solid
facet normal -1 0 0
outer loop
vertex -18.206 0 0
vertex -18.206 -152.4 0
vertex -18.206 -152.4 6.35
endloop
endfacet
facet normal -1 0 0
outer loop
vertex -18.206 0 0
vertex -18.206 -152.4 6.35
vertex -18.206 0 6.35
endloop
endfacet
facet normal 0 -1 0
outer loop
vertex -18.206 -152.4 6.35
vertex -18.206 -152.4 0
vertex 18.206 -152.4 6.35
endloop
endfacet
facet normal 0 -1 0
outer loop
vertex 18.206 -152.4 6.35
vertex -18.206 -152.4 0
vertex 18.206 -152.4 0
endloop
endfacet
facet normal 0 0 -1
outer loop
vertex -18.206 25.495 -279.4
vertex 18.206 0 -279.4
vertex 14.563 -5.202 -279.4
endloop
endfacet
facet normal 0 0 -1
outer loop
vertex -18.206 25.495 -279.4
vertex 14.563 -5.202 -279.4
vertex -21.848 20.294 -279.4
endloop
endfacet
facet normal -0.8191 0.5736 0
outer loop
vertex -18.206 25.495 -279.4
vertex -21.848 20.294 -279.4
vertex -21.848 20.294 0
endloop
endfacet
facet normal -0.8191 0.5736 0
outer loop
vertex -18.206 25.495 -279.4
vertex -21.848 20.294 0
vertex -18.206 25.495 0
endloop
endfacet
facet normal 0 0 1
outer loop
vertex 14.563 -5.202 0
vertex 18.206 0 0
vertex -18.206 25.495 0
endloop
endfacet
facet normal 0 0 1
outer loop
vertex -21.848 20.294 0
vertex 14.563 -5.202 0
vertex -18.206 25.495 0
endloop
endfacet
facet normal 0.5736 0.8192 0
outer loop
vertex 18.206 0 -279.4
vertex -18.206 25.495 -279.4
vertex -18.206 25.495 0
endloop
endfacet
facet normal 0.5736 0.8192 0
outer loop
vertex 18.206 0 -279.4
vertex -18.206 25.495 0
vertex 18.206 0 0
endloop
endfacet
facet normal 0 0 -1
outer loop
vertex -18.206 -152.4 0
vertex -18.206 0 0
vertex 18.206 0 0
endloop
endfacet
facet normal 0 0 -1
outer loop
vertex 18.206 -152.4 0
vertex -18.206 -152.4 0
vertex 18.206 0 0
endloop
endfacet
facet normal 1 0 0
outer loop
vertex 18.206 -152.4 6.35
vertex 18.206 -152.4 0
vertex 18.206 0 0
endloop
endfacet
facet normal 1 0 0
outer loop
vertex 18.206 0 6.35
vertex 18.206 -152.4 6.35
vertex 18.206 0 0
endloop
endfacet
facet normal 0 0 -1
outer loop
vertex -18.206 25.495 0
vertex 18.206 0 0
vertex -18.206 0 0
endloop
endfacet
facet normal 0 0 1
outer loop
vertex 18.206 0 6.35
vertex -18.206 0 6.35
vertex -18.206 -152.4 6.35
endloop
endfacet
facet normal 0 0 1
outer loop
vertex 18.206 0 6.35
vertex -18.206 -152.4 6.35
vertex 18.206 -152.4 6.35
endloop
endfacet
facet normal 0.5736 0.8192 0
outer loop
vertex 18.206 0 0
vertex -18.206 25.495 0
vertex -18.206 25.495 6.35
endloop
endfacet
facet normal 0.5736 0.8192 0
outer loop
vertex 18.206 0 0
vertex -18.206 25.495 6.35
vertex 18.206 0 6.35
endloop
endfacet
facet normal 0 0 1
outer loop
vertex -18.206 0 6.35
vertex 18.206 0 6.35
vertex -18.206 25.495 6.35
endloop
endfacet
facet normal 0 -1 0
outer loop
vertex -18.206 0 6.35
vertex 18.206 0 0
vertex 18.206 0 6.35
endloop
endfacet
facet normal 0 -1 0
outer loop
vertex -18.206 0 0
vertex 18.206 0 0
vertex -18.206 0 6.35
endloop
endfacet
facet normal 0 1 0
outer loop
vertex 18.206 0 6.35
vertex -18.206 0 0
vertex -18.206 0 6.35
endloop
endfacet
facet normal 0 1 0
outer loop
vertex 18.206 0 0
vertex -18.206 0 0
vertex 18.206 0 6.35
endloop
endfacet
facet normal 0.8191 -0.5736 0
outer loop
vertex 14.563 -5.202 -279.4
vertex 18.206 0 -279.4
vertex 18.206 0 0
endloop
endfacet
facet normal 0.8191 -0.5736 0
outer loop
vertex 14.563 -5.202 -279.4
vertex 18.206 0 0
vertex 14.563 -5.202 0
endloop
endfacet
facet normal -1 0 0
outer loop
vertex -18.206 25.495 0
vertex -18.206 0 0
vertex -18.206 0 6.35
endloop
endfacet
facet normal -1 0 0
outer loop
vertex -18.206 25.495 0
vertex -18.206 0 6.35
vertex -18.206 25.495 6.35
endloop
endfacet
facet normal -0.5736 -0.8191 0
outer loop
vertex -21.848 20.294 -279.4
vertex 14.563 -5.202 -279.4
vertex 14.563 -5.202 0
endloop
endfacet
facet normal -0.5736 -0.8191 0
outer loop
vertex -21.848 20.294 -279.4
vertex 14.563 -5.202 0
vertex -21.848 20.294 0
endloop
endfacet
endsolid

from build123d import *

# Parameters (mm, degrees)
BOSS_EXTRUDE1_DEPTH = 6.35
SKETCH2_W           = 36.411308368
SKETCH2_H           = 152.4
BOSS_EXTRUDE2_DEPTH = 6.35
BOSS_EXTRUDE3_DEPTH = 279.4


with BuildPart() as part:
    # Sketch1 → Boss-Extrude1 (new body)
    with BuildSketch(Plane.XY):
        Polygon((-18.205654184, 25.495472596), (18.205654184, 0), (-18.205654184, 0), align=None)
    extrude(amount=BOSS_EXTRUDE1_DEPTH)


with BuildPart() as body_2:
    # Sketch2 → Boss-Extrude2 (new body)
    with BuildSketch(Plane.XY):
        with Locations((0, -76.2)):
            Rectangle(SKETCH2_W, SKETCH2_H)
    extrude(amount=BOSS_EXTRUDE2_DEPTH)


with BuildPart() as body_3:
    # Sketch3 → Boss-Extrude3 (new body)
    with BuildSketch(Plane.XY):
        Polygon((-18.205654184, 25.495472596), (18.205654184, 0), (14.563443813, -5.201615481), (-21.847864555, 20.293857115), align=None)
    extrude(amount=-BOSS_EXTRUDE3_DEPTH)


solid = Compound([part.part, body_2.part, body_3.part])
